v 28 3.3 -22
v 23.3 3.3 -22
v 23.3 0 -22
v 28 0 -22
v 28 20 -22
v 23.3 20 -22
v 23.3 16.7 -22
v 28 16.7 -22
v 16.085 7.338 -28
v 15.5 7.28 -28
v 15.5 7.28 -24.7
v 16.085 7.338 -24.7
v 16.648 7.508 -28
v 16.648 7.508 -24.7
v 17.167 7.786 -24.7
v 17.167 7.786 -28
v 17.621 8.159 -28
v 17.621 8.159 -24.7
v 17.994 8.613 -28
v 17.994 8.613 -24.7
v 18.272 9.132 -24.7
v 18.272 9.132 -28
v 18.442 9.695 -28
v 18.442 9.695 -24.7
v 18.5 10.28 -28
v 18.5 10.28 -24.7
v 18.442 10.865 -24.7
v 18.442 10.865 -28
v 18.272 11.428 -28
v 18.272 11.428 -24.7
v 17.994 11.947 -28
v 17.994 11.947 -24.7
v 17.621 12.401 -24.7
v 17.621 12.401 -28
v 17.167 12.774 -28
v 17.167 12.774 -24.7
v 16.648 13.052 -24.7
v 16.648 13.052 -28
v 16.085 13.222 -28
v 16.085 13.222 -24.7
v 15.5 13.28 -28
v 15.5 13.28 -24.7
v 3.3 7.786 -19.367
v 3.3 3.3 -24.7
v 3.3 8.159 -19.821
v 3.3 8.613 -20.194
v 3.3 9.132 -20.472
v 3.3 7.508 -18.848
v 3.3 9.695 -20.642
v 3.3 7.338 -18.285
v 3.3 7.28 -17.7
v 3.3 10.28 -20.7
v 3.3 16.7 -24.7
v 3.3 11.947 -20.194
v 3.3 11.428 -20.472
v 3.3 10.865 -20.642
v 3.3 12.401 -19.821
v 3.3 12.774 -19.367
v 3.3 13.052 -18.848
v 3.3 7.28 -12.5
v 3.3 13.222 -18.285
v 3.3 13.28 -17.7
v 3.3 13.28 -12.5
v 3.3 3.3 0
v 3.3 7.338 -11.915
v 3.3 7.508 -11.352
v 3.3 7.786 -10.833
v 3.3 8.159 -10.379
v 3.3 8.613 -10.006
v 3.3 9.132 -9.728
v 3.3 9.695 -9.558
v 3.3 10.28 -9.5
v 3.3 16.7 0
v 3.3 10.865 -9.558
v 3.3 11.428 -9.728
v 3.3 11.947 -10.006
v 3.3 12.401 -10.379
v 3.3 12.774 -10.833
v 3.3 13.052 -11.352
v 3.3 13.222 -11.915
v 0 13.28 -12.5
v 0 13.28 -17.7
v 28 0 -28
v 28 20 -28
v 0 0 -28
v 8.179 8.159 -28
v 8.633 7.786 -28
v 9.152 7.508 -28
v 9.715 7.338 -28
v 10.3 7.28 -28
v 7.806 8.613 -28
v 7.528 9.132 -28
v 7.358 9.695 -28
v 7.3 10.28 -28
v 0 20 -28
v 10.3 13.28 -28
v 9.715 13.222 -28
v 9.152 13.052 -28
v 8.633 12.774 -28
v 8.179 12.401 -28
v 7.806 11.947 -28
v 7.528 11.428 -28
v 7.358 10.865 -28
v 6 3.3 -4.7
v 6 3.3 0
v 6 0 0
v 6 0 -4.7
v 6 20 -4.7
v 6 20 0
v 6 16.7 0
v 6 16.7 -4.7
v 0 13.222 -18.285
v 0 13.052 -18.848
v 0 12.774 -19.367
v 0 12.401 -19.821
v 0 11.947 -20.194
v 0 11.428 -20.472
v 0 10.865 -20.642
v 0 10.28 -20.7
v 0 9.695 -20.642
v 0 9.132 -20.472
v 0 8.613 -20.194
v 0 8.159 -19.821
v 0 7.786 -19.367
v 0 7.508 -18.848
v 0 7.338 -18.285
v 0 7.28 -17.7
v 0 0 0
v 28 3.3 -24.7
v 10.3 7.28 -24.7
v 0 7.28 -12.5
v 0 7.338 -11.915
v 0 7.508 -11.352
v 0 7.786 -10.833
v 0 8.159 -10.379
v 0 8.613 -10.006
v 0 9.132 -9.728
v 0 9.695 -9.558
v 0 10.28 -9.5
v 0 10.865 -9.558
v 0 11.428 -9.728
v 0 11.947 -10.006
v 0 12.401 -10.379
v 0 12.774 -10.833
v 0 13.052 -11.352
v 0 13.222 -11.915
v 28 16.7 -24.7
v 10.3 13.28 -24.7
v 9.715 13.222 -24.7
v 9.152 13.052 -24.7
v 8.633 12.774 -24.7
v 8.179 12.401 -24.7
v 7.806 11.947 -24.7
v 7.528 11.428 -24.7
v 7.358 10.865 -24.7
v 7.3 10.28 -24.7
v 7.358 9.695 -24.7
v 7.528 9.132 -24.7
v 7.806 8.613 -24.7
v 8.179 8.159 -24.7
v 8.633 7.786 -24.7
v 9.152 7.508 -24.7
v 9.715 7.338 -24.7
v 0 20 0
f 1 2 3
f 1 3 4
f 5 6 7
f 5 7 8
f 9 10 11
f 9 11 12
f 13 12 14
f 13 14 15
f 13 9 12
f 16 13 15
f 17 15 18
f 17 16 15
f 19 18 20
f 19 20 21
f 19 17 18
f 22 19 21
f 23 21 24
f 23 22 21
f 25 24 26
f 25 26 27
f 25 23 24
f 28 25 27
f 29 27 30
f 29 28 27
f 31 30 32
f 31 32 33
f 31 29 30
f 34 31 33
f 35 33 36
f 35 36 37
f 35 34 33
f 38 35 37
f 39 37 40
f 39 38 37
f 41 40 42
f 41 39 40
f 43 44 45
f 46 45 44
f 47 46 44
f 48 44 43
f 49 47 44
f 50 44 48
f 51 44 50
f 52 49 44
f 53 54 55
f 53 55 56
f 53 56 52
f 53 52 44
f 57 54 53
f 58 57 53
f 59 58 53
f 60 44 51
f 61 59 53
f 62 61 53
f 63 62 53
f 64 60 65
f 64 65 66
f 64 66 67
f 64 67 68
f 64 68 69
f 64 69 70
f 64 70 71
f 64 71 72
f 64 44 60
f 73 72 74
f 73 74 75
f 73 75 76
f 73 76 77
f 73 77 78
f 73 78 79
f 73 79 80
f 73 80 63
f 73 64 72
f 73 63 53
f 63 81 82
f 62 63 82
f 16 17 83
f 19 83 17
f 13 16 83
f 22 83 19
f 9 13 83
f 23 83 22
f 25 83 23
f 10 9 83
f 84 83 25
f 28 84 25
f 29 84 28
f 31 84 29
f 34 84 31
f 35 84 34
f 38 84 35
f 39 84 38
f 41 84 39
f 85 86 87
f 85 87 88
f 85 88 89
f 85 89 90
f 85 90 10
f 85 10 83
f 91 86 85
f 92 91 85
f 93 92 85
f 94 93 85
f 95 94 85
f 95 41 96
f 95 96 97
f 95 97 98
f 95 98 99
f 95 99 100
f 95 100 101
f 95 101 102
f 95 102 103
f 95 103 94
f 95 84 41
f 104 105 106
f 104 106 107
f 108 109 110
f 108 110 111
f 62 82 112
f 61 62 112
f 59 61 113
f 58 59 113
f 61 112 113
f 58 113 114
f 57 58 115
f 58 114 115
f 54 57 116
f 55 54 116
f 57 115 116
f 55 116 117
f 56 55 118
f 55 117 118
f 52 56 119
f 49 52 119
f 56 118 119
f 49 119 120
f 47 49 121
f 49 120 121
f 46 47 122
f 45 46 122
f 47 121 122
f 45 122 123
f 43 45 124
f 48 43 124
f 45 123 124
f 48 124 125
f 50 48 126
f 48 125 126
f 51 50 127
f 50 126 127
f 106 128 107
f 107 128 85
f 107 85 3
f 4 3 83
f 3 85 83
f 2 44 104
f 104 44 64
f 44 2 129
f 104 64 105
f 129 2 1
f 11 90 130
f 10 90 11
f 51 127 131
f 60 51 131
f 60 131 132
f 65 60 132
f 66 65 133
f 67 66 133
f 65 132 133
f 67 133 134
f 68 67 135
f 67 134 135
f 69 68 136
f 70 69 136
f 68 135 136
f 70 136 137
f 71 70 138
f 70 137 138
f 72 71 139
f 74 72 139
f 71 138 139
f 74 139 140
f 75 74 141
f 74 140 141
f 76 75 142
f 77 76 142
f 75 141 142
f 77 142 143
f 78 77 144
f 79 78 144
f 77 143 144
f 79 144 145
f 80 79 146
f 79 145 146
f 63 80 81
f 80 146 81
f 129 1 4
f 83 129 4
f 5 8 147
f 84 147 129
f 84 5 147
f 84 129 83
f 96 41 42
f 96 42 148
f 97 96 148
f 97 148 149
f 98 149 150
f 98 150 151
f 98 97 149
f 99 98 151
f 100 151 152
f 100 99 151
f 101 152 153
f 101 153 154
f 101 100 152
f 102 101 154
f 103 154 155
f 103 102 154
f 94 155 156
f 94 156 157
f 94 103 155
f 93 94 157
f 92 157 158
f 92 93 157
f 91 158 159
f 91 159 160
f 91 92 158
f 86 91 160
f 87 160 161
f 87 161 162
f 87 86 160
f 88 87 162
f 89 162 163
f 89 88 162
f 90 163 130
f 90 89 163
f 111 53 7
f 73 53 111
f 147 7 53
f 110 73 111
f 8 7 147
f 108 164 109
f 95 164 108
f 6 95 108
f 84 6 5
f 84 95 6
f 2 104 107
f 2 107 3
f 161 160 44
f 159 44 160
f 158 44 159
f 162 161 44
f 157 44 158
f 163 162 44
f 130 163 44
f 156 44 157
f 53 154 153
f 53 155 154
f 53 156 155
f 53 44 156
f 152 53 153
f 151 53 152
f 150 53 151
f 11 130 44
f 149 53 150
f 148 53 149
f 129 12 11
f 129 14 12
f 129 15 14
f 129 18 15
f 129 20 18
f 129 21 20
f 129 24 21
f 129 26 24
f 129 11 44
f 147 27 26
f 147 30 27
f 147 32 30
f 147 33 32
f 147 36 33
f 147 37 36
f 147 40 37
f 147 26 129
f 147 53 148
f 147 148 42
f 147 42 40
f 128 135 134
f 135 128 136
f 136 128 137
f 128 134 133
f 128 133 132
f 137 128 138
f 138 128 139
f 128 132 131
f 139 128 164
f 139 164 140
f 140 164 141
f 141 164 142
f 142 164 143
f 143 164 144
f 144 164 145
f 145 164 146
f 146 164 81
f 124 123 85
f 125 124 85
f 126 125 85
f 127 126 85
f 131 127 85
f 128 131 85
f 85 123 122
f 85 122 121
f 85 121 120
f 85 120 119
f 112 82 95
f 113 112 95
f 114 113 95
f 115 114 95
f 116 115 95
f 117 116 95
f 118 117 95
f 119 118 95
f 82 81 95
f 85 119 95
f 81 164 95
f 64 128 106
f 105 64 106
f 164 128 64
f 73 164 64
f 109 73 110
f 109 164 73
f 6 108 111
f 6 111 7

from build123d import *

# Parameters (mm, degrees)
SKETCH1_W           = 28
SKETCH1_H           = 20
BOSS_EXTRUDE1_DEPTH = 3.3
BOSS_EXTRUDE2_DEPTH = 10
SKETCH3_W           = 24.7
SKETCH3_H           = 13.4
CUT_EXTRUDE1_DEPTH  = 24.7


with BuildPart() as part:
    # Sketch1 → Boss-Extrude1 (new body)
    with BuildSketch(Plane(origin=(0, 0, 0), x_dir=(0, 0, -1), z_dir=(1, 0, 0))):
        with Locations((14, 10)):
            Rectangle(SKETCH1_W, SKETCH1_H)
        with BuildLine():
            Line((12.5, 13.28), (17.7, 13.28))
            ThreePointArc((17.7, 13.28), (20.7, 10.28), (17.7, 7.28))
            Line((17.7, 7.28), (12.5, 7.28))
            ThreePointArc((12.5, 7.28), (9.5, 10.28), (12.5, 13.28))
        make_face(mode=Mode.SUBTRACT)
    boss_extrude1 = extrude(amount=BOSS_EXTRUDE1_DEPTH)

    # Mirror1: Boss-Extrude1 across plane
    add(boss_extrude1.mirror(Plane(origin=(14, 0, -14), x_dir=(0.707106781, 0, 0.707106781), z_dir=(-0.707106781, 0, 0.707106781))))

    # Sketch2 → Boss-Extrude2 (add, symmetric)
    with BuildSketch(Plane(origin=(0, 10, 0), x_dir=(1, 0, 0), z_dir=(0, 1, 0))):
        Polygon((3.3, 0), (6, 0), (6, 4.7), (23.3, 22), (28, 22), (28, 24.7), (3.3, 24.7), align=None)
    extrude(amount=BOSS_EXTRUDE2_DEPTH, both=True)

    # Sketch3 → Cut-Extrude1 (cut)
    with BuildSketch(Plane.XY):
        with Locations((15.65, 10)):
            Rectangle(SKETCH3_W, SKETCH3_H)
    extrude(amount=-CUT_EXTRUDE1_DEPTH, mode=Mode.SUBTRACT)


solid = part.part
